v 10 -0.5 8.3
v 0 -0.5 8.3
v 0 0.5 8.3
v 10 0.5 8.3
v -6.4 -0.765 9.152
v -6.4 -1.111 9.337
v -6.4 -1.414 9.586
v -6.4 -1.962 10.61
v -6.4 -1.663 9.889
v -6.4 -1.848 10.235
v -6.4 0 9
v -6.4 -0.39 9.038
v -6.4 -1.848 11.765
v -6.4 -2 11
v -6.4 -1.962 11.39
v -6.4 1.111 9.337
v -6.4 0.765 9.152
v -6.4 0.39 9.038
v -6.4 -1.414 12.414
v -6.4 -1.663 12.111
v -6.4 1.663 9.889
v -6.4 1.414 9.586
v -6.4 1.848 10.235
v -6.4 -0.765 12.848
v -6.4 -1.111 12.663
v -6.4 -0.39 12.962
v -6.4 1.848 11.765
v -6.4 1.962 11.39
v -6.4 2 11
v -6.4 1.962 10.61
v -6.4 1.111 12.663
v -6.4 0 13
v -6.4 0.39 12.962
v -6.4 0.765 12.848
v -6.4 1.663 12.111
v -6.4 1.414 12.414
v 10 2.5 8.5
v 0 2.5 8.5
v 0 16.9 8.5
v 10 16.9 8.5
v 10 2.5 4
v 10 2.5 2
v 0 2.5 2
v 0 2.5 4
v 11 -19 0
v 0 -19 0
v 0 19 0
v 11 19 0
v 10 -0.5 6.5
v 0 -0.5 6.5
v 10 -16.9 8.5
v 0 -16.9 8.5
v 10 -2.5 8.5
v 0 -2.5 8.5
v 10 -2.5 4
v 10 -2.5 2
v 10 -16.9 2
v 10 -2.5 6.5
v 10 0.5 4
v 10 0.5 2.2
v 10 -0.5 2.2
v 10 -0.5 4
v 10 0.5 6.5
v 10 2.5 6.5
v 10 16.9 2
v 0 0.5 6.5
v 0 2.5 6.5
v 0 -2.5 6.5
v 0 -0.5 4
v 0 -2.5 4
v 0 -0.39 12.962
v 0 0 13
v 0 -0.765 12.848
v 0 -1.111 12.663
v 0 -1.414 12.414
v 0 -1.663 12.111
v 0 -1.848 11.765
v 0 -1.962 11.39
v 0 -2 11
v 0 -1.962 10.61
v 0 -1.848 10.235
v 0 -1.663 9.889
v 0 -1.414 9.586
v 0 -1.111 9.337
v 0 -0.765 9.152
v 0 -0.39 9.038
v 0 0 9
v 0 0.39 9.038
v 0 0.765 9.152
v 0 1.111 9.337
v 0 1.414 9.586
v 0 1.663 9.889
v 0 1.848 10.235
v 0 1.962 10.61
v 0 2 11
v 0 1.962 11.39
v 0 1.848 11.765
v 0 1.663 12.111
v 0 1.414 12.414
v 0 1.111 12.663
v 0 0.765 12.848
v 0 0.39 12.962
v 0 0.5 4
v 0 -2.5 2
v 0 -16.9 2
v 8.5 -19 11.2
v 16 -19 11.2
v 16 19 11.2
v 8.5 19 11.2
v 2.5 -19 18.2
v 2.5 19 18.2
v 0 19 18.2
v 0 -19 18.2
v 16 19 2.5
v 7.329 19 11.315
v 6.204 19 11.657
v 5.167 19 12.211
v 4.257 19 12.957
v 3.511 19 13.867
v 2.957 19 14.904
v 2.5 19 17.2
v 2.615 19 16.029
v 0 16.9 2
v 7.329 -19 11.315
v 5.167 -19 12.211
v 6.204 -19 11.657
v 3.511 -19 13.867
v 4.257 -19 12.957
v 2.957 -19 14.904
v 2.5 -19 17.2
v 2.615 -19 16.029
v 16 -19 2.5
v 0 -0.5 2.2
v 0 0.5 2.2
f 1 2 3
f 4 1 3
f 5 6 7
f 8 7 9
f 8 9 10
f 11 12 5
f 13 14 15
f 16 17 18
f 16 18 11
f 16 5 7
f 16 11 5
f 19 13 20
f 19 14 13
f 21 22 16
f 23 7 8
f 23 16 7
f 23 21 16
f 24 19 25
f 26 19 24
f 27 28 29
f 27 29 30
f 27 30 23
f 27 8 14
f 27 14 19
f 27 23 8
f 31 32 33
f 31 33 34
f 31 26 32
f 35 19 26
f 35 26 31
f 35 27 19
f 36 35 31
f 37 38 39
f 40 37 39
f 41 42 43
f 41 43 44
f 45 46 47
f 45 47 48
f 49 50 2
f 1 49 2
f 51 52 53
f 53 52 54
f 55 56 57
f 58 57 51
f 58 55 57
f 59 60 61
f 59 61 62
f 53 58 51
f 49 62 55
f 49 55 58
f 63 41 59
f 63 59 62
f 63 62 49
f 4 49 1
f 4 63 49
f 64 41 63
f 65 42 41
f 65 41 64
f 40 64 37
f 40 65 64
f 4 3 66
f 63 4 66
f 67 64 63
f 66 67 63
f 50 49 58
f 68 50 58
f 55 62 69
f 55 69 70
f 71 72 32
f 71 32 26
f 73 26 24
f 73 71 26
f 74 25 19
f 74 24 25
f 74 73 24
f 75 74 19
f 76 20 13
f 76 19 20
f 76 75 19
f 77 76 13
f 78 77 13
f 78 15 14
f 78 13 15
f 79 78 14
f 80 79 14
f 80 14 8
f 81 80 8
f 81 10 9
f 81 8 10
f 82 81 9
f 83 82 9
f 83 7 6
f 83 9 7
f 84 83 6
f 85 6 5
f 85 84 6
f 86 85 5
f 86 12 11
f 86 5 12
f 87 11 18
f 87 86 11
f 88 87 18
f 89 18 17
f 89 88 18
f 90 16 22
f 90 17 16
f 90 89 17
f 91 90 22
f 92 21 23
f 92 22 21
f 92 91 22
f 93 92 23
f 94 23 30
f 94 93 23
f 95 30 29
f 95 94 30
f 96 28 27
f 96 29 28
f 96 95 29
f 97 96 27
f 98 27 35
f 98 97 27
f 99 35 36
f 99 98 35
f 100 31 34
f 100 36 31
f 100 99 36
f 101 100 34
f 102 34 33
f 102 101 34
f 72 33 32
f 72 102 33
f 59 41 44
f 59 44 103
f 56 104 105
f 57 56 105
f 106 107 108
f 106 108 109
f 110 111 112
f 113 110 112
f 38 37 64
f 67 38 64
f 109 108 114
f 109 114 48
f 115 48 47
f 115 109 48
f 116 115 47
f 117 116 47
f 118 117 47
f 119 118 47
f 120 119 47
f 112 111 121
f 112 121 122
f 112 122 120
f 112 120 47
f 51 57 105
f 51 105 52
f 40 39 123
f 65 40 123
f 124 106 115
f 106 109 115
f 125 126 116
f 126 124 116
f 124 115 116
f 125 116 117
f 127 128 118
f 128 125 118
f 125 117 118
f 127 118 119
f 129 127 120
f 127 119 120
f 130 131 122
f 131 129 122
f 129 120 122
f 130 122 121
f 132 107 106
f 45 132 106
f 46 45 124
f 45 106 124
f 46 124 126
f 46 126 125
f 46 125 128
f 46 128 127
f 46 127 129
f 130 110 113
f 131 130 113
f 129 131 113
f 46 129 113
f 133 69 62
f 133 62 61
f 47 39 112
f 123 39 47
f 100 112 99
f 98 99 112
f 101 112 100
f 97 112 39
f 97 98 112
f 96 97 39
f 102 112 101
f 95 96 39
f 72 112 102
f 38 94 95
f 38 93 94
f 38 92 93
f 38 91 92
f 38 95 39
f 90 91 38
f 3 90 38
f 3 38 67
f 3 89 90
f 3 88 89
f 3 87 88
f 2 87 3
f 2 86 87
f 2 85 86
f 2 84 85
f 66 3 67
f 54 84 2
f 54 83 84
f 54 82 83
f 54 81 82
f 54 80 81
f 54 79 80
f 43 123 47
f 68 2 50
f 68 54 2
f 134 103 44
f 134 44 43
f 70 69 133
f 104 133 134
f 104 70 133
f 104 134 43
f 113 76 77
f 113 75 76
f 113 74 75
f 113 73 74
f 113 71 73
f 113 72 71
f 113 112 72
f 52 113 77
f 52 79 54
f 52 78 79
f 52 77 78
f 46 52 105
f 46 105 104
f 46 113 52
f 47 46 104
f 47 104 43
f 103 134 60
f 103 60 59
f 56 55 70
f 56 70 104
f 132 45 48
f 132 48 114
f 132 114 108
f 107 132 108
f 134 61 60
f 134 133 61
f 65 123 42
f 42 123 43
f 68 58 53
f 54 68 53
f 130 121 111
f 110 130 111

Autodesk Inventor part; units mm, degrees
ref_plane "YZ Plane" through (0, 0, 0) normal (1, 0, 0) x (0, 1, 0)
ref_plane "XZ Plane" through (0, 0, 0) normal (0, 1, 0) x (-1, 0, 0)
ref_plane "XY Plane" through (0, 0, 0) normal (0, 0, 1) x (1, 0, 0)
sketch "Sketch2" plane through (0, 0, 0) normal (0, 1, 0) x (-1, 0, 0)
  line L0 (0, 18.2) -> (0, 0)
  line L1 (0, 0) -> (-11, 0)
  line L2 (-11, 0) -> (-16, 2.5)
  line L3 (-16, 2.5) -> (-16, 11.2)
  line L4 (-16, 11.2) -> (-2.5, 11.2)
  line L5 (-2.5, 11.2) -> (-2.5, 18.2)
  line L6 (-2.5, 18.2) -> (0, 18.2)
  dimension "d0" = 18.2
  dimension "d1" = 11.2
  dimension "d2" = 2.5
  dimension "d3" = 16
  dimension "d4" = 5
  dimension "d5" = 2.5
extrude "Extrusion1" add sketch "Sketch2" along normal mid plane 38
fillet "Fillet1" radius 6 1 edges at (2.5, 0, 11.2)
sketch "Sketch3" plane through (0, -19, 18.2) normal (-1, 0, 0) x (0, 0, 1)
  line L0 (-9.7, 35.9) -> (-16.2, 35.9)
  line L1 (-16.2, 35.9) -> (-16.2, 2.1)
  line L2 (-16.2, 2.1) -> (-9.7, 2.1)
  line L3 (-9.7, 2.1) -> (-9.7, 35.9)
  line L4 (-18.2, 19) -> (-16.2, 19) construction
  line L5 (-18.2, 38) -> (-18.2, 0) construction
  line L6 (0, 0) -> (-18.2, 0) construction
  line L7 (-18.2, 38) -> (0, 38) construction
  dimension "d9" = 2
  dimension "d10" = 33.8
  dimension "d11" = 6.5
extrude "Extrusion2" cut sketch "Sketch3" against normal blind 10
sketch "Sketch4" plane through (0, -19, 18.2) normal (-1, 0, 0) x (0, 0, 1)
  circle A0 centre (-7.2, 19) radius 2
  line L0 (-7.2, 19) -> (-18.2, 19) construction
  dimension "d14" = 4
  dimension "d15" = 11
extrude "Extrusion3" add sketch "Sketch4" along normal blind 6.4
sketch "Sketch5" plane through (0, -19, 18.2) normal (-1, 0, 0) x (0, 0, 1)
  line L0 (-9.7, 21.5) -> (-11.7, 21.5)
  line L1 (-11.7, 16.5) -> (-9.7, 16.5)
  line L2 (-9.7, 16.5) -> (-9.7, 21.5)
  line L3 (-16.2, 35.9) -> (-9.7, 35.9) construction
  line L4 (-9.7, 2.1) -> (-16.2, 2.1) construction
  line L5 (-9.7, 35.9) -> (-9.7, 2.1) construction
  line L6 (-12.95, 35.9) -> (-12.95, 2.1) construction
  line L7 (-18.2, 19) -> (-9.9, 19)
  line L8 (-11.7, 18.5) -> (-9.9, 18.5)
  line L9 (-9.9, 18.5) -> (-9.9, 19.5)
  line L10 (-9.9, 19.5) -> (-11.7, 19.5)
  line L11 (-11.7, 21.5) -> (-11.7, 19.5)
  line L12 (-11.7, 18.5) -> (-11.7, 16.5)
  line L13 (-16.2, 21.5) -> (-14.2, 21.5)
  line L14 (-14.2, 16.5) -> (-16.2, 16.5)
  line L15 (-16.2, 16.5) -> (-16.2, 21.5)
  line L16 (-14.2, 18.5) -> (-16, 18.5)
  line L17 (-16, 18.5) -> (-16, 19.5)
  line L18 (-16, 19.5) -> (-14.2, 19.5)
  line L19 (-14.2, 21.5) -> (-14.2, 19.5)
  line L20 (-14.2, 18.5) -> (-14.2, 16.5)
  point P0 (-16, 19)
  dimension "d19" = 5
  dimension "d20" = 2
  dimension "d21" = 2.5
  dimension "d22" = 1
  dimension "d23" = 1.8
extrude "Extrusion4" add sketch "Sketch5" against normal up to next
properties part number "Boton de extraccion" material "ABS Plastic"
